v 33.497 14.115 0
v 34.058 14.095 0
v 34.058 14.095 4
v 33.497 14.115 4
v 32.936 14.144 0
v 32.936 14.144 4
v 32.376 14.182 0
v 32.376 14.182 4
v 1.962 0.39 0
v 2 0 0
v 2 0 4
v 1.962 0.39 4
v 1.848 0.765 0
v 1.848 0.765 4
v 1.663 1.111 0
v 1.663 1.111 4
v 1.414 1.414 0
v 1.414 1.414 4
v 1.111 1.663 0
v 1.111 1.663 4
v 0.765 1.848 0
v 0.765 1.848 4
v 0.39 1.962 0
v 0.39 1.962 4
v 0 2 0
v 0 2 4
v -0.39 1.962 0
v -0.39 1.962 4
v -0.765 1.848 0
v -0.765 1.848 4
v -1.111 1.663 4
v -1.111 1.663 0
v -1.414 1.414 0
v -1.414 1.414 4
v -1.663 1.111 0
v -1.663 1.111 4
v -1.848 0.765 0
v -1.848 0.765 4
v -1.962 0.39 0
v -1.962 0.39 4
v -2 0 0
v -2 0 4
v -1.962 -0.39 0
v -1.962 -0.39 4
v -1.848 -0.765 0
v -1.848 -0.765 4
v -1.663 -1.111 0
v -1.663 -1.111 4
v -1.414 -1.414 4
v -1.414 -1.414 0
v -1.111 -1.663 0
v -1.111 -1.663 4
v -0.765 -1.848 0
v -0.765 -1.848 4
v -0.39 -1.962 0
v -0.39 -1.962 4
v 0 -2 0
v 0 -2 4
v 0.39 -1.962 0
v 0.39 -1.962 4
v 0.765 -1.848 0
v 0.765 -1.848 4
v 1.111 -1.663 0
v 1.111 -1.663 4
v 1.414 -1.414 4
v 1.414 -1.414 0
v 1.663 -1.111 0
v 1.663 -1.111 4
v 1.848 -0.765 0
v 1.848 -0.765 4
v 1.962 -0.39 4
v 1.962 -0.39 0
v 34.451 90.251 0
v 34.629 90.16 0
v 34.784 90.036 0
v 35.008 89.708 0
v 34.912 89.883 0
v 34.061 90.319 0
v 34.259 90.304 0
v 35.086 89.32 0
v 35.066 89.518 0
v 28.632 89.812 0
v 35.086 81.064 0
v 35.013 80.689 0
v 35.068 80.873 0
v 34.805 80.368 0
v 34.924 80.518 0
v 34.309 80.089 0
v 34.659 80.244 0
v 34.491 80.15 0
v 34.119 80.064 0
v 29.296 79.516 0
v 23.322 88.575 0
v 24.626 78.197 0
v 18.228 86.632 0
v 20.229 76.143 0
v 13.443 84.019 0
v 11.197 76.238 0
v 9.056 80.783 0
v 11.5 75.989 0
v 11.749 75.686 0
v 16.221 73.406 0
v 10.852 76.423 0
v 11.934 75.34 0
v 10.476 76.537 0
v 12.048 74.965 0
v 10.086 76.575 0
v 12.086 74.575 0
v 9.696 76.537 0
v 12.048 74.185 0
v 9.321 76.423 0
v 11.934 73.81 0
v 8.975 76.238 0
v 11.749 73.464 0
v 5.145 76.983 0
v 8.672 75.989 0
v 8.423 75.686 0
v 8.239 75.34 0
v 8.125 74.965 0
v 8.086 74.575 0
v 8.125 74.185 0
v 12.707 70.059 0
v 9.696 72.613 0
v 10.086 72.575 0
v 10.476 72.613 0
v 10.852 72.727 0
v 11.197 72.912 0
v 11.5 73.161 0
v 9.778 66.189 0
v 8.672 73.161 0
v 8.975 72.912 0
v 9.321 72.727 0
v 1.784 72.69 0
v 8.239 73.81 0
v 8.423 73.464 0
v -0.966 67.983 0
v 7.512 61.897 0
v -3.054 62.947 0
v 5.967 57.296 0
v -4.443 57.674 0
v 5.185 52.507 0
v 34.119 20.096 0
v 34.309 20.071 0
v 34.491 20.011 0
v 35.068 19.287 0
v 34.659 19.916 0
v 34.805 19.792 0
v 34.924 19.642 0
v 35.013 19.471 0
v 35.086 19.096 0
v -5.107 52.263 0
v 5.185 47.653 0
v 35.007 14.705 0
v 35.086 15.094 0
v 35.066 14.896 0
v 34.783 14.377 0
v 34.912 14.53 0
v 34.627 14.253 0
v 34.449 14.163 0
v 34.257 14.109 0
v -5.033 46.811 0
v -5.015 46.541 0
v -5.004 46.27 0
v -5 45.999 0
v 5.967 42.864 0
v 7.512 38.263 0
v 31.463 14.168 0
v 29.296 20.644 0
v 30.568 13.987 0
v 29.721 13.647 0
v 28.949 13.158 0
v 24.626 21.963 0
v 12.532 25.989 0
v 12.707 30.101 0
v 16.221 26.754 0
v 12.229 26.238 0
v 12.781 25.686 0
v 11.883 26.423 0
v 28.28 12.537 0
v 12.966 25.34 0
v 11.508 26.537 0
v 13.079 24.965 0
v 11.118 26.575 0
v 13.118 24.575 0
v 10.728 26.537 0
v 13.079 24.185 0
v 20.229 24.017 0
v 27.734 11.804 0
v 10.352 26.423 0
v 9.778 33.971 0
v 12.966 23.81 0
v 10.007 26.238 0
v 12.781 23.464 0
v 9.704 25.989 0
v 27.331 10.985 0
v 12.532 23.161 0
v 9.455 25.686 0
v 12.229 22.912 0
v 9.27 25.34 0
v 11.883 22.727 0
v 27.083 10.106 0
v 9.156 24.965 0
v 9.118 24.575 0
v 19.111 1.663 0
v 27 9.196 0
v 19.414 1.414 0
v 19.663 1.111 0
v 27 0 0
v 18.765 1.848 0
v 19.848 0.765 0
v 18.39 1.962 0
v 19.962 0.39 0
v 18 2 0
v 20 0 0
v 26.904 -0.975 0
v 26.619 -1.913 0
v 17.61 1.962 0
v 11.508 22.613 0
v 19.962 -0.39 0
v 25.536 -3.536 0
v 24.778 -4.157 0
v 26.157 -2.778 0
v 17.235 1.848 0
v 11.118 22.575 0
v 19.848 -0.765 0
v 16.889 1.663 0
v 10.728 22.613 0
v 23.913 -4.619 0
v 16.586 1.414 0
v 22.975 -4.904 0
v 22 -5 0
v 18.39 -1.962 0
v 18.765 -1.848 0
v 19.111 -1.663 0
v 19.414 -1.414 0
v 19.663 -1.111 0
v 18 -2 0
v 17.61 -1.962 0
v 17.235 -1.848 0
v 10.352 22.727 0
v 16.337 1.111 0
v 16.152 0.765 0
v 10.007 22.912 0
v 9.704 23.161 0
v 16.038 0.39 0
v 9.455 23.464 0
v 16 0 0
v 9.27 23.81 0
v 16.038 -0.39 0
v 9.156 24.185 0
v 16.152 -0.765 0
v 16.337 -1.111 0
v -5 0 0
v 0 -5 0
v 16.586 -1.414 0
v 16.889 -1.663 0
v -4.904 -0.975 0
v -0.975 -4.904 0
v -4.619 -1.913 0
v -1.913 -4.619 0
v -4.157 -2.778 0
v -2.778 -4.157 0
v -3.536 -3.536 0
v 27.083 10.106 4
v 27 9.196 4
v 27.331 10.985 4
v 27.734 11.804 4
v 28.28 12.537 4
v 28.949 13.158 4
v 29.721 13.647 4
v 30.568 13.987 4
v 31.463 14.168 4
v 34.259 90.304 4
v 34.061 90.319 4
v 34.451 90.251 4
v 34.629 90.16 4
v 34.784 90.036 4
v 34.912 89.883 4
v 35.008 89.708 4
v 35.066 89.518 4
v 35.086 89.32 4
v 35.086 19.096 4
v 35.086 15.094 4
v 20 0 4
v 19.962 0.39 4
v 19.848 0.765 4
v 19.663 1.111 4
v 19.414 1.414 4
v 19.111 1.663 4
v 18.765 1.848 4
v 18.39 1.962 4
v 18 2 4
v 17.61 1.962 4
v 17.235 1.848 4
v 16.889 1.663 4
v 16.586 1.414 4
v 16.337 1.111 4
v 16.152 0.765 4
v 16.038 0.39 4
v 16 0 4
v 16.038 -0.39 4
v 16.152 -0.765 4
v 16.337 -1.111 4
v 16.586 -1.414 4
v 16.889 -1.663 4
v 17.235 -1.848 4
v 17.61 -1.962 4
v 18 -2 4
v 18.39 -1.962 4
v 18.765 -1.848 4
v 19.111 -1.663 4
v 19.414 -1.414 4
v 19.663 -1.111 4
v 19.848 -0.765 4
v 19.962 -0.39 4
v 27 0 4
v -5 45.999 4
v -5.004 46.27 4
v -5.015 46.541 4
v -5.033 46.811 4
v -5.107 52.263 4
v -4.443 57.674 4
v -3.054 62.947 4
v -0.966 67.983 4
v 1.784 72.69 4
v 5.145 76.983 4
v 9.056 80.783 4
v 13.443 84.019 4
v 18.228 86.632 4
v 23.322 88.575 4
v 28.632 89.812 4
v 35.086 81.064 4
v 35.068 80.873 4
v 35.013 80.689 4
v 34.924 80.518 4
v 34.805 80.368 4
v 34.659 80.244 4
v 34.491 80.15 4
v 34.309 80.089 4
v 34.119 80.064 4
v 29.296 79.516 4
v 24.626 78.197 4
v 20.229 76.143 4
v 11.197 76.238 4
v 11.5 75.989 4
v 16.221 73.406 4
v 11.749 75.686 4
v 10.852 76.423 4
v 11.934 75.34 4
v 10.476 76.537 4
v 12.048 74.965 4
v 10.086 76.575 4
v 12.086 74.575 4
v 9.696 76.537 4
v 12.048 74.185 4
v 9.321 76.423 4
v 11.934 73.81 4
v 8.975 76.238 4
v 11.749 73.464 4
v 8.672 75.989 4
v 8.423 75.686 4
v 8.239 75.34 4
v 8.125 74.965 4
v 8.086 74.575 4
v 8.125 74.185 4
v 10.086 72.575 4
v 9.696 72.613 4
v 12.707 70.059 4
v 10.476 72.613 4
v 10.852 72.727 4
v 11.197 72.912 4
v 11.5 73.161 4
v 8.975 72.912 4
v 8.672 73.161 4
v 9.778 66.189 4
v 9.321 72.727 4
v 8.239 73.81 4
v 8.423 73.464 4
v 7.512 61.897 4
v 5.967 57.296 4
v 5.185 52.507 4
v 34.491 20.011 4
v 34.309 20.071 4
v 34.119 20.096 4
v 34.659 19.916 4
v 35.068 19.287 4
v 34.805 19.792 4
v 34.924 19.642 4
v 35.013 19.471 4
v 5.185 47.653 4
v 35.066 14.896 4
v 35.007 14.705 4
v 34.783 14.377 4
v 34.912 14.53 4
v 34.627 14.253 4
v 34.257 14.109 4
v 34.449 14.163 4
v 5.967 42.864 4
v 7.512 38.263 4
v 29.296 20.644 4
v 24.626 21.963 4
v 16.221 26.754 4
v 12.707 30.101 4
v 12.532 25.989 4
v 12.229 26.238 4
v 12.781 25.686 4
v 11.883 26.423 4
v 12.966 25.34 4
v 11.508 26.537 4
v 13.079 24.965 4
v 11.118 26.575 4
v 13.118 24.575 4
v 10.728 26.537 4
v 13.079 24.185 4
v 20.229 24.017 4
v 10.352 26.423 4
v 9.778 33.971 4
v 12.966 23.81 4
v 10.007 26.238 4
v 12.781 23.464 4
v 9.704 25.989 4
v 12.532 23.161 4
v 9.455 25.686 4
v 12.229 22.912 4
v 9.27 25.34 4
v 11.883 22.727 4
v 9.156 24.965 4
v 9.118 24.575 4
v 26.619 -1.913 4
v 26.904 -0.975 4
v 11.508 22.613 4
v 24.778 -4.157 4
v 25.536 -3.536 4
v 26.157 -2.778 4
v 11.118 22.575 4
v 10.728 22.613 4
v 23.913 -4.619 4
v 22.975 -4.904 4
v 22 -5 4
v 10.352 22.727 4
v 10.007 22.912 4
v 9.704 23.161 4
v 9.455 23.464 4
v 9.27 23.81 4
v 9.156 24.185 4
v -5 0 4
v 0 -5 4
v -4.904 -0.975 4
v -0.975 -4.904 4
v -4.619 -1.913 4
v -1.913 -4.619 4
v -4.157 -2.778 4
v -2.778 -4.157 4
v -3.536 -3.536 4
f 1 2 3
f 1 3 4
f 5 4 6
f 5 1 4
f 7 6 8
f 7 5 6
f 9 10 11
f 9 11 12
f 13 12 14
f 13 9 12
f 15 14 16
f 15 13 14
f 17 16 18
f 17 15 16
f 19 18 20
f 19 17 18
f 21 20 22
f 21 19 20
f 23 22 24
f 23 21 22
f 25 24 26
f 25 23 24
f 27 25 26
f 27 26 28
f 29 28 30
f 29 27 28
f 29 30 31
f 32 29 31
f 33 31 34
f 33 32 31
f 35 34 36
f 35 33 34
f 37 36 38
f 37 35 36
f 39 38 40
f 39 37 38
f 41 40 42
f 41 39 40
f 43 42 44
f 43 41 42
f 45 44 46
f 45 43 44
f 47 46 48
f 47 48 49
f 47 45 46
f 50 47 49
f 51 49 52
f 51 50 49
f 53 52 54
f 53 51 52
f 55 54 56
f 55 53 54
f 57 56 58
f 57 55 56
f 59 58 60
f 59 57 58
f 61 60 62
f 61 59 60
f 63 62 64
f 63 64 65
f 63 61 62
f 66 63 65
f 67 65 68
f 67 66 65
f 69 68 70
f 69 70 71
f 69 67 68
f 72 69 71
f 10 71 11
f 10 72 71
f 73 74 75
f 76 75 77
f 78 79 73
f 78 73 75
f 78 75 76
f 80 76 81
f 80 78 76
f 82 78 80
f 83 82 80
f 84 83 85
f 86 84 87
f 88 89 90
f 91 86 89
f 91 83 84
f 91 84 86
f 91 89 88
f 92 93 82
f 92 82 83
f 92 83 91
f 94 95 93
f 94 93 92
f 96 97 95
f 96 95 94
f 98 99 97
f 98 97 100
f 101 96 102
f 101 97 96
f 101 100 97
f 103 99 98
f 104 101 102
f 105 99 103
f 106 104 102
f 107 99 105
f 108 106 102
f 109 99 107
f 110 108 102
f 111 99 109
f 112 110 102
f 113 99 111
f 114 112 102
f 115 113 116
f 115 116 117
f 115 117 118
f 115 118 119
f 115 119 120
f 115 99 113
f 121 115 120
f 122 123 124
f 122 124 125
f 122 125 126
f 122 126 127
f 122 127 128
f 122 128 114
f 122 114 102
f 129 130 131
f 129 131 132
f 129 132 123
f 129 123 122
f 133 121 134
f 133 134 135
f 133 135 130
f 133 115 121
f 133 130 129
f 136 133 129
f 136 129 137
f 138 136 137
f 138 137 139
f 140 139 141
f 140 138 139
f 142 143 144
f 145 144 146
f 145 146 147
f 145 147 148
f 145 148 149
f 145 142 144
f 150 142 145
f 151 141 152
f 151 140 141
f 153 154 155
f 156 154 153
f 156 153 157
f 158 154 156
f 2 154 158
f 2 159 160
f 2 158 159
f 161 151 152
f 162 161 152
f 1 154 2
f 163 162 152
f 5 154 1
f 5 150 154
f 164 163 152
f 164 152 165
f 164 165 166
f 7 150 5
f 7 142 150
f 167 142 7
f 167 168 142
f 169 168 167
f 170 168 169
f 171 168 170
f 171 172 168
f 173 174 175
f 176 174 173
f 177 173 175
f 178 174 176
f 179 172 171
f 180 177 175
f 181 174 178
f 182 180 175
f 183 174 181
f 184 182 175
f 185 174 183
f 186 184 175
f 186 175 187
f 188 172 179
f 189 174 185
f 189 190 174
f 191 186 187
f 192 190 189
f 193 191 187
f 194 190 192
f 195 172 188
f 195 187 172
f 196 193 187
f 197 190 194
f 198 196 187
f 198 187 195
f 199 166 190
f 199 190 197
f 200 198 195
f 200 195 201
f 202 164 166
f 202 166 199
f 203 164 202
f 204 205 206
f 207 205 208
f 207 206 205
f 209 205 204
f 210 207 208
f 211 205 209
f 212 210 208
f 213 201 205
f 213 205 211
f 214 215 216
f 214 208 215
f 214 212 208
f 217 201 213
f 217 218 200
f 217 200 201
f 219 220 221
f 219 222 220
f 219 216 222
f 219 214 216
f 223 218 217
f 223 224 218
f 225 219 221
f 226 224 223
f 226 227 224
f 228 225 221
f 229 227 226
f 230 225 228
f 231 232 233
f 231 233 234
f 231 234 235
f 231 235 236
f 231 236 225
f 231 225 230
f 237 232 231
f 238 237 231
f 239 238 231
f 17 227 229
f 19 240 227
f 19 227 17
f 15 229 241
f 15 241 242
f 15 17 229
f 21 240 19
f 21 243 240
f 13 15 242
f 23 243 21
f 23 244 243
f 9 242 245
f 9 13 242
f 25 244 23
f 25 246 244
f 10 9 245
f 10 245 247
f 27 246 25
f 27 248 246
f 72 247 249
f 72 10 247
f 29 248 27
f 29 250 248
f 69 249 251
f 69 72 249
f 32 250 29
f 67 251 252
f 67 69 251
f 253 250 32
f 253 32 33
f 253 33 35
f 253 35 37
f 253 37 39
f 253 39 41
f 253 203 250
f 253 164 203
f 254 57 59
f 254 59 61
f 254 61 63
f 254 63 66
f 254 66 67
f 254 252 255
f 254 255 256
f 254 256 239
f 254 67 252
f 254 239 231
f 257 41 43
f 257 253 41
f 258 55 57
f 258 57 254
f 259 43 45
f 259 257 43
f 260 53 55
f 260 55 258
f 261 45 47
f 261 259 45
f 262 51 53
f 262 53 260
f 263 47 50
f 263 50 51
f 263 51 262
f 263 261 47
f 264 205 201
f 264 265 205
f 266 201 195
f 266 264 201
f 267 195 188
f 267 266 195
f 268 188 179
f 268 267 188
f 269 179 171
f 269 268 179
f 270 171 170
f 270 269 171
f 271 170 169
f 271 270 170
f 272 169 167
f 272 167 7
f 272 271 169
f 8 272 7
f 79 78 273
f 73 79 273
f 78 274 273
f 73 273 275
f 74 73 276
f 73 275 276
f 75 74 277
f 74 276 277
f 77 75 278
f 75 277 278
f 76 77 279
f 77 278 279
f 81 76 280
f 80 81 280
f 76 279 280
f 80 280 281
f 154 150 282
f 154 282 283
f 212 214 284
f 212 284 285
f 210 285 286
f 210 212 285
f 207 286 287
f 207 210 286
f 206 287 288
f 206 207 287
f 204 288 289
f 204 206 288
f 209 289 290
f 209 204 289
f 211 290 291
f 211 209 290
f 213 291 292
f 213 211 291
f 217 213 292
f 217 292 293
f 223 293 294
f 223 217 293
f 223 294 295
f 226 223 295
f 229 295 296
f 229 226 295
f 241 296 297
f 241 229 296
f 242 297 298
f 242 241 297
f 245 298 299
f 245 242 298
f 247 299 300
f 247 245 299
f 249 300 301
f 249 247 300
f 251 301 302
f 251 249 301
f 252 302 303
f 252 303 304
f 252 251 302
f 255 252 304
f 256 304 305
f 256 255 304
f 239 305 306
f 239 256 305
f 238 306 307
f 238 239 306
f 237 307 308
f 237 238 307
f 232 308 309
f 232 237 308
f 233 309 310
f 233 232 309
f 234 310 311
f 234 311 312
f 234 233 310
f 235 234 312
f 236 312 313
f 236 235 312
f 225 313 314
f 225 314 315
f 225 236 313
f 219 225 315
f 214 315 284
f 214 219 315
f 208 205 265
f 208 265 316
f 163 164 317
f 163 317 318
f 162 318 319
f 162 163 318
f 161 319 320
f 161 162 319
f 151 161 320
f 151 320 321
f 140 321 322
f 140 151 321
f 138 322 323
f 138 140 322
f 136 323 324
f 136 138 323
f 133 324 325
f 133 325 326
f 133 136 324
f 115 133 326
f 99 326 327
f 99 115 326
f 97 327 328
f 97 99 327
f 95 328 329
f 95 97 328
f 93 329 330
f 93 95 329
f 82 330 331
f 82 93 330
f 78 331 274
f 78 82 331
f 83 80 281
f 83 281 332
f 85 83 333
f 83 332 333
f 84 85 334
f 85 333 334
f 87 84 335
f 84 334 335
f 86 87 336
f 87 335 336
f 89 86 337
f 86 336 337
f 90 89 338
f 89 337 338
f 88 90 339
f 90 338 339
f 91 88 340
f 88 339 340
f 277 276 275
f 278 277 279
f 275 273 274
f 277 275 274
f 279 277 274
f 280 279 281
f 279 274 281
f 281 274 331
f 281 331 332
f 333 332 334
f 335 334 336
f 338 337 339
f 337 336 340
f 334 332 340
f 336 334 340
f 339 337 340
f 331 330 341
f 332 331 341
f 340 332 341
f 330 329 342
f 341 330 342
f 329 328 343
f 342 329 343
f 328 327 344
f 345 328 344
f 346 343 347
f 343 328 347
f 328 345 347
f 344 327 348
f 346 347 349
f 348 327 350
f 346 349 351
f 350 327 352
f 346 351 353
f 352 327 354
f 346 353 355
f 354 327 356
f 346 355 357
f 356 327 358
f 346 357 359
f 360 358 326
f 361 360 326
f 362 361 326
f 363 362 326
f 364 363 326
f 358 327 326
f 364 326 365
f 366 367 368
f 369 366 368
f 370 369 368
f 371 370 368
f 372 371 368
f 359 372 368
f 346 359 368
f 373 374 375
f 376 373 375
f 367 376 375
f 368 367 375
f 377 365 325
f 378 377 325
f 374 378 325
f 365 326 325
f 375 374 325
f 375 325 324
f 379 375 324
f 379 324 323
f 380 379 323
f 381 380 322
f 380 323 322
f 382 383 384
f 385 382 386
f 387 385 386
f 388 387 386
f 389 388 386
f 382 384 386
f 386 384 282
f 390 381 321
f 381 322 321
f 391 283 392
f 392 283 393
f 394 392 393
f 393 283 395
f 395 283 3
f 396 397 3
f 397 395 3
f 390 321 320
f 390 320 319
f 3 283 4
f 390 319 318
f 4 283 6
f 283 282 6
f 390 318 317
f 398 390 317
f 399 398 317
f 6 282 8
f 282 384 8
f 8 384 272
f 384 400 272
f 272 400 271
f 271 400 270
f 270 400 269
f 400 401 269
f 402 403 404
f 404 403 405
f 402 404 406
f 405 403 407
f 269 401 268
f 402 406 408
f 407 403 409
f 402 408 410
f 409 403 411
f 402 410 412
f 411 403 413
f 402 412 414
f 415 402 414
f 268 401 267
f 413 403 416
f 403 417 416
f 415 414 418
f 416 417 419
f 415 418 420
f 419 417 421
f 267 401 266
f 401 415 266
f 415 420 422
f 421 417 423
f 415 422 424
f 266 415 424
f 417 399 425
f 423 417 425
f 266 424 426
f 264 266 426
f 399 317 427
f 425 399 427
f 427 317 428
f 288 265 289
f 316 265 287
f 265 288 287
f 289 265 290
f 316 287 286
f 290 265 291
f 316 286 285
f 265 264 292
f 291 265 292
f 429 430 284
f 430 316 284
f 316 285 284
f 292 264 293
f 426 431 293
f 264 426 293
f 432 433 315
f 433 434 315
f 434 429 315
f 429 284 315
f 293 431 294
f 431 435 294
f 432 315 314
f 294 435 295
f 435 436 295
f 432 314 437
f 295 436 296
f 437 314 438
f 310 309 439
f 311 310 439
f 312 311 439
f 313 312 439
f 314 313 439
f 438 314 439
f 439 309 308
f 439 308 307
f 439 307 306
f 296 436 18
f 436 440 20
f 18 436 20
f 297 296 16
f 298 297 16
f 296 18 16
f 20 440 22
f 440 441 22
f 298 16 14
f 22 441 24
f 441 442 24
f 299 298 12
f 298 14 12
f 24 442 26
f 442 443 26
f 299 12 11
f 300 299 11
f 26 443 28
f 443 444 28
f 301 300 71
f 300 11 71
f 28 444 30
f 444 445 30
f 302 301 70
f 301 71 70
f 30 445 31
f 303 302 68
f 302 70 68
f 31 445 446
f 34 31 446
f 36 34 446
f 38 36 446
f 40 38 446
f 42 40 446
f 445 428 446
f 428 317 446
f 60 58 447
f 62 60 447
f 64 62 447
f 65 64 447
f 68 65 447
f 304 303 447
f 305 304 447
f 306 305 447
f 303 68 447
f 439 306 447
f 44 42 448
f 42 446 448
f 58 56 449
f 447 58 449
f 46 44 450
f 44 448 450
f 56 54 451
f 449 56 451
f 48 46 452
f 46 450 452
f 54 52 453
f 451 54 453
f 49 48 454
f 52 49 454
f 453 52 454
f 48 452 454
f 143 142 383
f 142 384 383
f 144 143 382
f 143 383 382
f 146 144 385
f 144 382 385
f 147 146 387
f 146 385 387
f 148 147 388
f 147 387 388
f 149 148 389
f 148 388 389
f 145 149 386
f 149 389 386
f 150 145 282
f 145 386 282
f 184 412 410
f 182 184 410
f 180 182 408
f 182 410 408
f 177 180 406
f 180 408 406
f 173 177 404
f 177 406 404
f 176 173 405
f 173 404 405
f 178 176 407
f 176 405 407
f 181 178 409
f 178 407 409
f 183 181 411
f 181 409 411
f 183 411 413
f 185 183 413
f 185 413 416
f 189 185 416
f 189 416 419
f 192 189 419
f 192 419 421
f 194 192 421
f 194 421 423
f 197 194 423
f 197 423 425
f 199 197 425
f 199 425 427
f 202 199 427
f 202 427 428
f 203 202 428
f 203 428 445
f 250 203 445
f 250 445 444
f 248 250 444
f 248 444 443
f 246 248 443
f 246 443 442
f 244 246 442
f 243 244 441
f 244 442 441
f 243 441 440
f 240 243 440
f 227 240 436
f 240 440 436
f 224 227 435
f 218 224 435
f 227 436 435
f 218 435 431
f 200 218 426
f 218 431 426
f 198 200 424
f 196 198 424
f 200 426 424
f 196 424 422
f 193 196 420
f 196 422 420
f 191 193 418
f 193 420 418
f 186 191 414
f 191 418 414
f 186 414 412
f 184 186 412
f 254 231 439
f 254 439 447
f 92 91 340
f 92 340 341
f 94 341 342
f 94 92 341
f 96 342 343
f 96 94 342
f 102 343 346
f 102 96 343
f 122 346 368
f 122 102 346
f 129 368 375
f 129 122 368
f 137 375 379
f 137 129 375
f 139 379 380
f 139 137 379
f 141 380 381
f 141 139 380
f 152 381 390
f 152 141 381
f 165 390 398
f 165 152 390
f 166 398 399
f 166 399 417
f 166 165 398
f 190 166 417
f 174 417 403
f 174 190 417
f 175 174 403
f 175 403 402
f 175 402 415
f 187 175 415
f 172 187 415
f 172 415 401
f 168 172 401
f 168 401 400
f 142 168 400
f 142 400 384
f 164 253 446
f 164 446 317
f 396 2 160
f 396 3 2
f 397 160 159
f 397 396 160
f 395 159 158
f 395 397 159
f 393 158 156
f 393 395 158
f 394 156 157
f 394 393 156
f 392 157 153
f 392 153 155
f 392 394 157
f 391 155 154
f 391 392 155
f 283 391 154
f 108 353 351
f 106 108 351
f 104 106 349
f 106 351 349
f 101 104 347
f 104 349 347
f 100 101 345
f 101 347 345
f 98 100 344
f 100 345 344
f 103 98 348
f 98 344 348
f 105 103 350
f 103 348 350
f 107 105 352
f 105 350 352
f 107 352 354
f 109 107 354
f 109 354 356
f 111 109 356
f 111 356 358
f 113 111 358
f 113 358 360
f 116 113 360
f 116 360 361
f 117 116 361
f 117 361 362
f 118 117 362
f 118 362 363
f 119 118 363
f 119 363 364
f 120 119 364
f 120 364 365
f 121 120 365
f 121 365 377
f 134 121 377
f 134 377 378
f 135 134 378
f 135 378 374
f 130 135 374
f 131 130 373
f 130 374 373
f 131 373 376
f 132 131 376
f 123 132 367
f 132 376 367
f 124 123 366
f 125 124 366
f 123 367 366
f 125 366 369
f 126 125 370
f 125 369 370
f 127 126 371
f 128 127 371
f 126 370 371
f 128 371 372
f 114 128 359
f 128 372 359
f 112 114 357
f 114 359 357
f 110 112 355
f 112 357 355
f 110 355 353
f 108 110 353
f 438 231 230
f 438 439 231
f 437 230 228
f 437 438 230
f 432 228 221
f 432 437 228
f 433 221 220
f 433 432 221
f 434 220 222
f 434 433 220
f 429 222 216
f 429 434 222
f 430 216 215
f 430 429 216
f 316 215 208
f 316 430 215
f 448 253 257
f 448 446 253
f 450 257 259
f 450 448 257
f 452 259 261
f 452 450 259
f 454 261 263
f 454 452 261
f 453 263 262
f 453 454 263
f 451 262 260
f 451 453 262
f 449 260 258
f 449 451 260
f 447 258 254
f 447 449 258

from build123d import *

# Parameters (mm, degrees)
SKETCH1_R           = 2
BOSS_EXTRUDE1_DEPTH = 4
FILLET10_R          = 1
FILLET11_R          = 10
FILLET12_R          = 5
FILLET13_R          = 5
FILLET14_R          = 5
SKETCH2_R           = 2
CUT_EXTRUDE1_DEPTH  = 20


with BuildPart() as part:
    # Sketch1 → Boss-Extrude1 (new body)
    with BuildSketch(Plane.XY):
        with BuildLine():
            Line((-5, -5), (-5, 46.428571429))
            ThreePointArc((-5, 46.428571429), (5.360662074, 77.221028176), (35.086282243, 90.332329282))
            Line((35.086282243, 90.332329282), (35.086282243, 80.08008038))
            ThreePointArc((35.086282243, 80.08008038), (5.086282243, 50.08008038), (35.086282243, 20.08008038))
            Line((35.086282243, 20.08008038), (35.086282243, 14.08008038))
            ThreePointArc((35.086282243, 14.08008038), (31.017062028, 14.31079961), (27, 15))
            Line((27, 15), (27, -5))
            Line((27, -5), (-5, -5))
        make_face()
        Circle(SKETCH1_R, mode=Mode.SUBTRACT)
        with Locations((18, 0)):
            Circle(SKETCH1_R, mode=Mode.SUBTRACT)
    extrude(amount=BOSS_EXTRUDE1_DEPTH)

    # Fillet10
    fillet10_edges = [part.edges().sort_by_distance(p)[0] for p in [
        (35.086282243, 90.332329282, 2),
        (35.086282243, 80.08008038, 2),
        (35.086282243, 20.08008038, 2),
        (35.086282243, 14.08008038, 2),
    ]]
    fillet(fillet10_edges, radius=FILLET10_R)

    # Fillet11
    # the kernel refuses this fillet: 10 mm, written as the material it adds along each edge
    with BuildSketch(Plane(origin=(-5, 46.428571429, 0), x_dir=(-0.08596186737445177, 0.996298427860597, 0), z_dir=(0, 0, 1))) as fillet11_piece_1:
        with BuildLine():
            CenterArc((0.431926178, 9.999886119), FILLET11_R, 265.068661729, 4.657897264)
            Line((-0.427692496, 0.03690184), (0, 0))
            ThreePointArc((0, 0), (0.19210095, 0.000458397), (0.3842019, 0))
        make_face()
    extrude(amount=4)

    # Fillet12
    fillet12_edges = [part.edges().sort_by_distance(p)[0] for p in [
        (-5, -5, 2),
    ]]
    fillet(fillet12_edges, radius=FILLET12_R)

    # Fillet13
    fillet13_edges = [part.edges().sort_by_distance(p)[0] for p in [
        (27, -5, 2),
    ]]
    fillet(fillet13_edges, radius=FILLET13_R)

    # Fillet14
    fillet14_edges = [part.edges().sort_by_distance(p)[0] for p in [
        (27, 15, 2),
    ]]
    fillet(fillet14_edges, radius=FILLET14_R)

    # Sketch2 → Cut-Extrude1 (cut)
    with BuildSketch(Plane.XY.offset(4)):
        with Locations((10.086282243, 74.574977808)):
            Circle(SKETCH2_R)
        with Locations((11.117766586, 24.574977808)):
            Circle(SKETCH2_R)
    extrude(amount=-CUT_EXTRUDE1_DEPTH, mode=Mode.SUBTRACT)


solid = part.part
